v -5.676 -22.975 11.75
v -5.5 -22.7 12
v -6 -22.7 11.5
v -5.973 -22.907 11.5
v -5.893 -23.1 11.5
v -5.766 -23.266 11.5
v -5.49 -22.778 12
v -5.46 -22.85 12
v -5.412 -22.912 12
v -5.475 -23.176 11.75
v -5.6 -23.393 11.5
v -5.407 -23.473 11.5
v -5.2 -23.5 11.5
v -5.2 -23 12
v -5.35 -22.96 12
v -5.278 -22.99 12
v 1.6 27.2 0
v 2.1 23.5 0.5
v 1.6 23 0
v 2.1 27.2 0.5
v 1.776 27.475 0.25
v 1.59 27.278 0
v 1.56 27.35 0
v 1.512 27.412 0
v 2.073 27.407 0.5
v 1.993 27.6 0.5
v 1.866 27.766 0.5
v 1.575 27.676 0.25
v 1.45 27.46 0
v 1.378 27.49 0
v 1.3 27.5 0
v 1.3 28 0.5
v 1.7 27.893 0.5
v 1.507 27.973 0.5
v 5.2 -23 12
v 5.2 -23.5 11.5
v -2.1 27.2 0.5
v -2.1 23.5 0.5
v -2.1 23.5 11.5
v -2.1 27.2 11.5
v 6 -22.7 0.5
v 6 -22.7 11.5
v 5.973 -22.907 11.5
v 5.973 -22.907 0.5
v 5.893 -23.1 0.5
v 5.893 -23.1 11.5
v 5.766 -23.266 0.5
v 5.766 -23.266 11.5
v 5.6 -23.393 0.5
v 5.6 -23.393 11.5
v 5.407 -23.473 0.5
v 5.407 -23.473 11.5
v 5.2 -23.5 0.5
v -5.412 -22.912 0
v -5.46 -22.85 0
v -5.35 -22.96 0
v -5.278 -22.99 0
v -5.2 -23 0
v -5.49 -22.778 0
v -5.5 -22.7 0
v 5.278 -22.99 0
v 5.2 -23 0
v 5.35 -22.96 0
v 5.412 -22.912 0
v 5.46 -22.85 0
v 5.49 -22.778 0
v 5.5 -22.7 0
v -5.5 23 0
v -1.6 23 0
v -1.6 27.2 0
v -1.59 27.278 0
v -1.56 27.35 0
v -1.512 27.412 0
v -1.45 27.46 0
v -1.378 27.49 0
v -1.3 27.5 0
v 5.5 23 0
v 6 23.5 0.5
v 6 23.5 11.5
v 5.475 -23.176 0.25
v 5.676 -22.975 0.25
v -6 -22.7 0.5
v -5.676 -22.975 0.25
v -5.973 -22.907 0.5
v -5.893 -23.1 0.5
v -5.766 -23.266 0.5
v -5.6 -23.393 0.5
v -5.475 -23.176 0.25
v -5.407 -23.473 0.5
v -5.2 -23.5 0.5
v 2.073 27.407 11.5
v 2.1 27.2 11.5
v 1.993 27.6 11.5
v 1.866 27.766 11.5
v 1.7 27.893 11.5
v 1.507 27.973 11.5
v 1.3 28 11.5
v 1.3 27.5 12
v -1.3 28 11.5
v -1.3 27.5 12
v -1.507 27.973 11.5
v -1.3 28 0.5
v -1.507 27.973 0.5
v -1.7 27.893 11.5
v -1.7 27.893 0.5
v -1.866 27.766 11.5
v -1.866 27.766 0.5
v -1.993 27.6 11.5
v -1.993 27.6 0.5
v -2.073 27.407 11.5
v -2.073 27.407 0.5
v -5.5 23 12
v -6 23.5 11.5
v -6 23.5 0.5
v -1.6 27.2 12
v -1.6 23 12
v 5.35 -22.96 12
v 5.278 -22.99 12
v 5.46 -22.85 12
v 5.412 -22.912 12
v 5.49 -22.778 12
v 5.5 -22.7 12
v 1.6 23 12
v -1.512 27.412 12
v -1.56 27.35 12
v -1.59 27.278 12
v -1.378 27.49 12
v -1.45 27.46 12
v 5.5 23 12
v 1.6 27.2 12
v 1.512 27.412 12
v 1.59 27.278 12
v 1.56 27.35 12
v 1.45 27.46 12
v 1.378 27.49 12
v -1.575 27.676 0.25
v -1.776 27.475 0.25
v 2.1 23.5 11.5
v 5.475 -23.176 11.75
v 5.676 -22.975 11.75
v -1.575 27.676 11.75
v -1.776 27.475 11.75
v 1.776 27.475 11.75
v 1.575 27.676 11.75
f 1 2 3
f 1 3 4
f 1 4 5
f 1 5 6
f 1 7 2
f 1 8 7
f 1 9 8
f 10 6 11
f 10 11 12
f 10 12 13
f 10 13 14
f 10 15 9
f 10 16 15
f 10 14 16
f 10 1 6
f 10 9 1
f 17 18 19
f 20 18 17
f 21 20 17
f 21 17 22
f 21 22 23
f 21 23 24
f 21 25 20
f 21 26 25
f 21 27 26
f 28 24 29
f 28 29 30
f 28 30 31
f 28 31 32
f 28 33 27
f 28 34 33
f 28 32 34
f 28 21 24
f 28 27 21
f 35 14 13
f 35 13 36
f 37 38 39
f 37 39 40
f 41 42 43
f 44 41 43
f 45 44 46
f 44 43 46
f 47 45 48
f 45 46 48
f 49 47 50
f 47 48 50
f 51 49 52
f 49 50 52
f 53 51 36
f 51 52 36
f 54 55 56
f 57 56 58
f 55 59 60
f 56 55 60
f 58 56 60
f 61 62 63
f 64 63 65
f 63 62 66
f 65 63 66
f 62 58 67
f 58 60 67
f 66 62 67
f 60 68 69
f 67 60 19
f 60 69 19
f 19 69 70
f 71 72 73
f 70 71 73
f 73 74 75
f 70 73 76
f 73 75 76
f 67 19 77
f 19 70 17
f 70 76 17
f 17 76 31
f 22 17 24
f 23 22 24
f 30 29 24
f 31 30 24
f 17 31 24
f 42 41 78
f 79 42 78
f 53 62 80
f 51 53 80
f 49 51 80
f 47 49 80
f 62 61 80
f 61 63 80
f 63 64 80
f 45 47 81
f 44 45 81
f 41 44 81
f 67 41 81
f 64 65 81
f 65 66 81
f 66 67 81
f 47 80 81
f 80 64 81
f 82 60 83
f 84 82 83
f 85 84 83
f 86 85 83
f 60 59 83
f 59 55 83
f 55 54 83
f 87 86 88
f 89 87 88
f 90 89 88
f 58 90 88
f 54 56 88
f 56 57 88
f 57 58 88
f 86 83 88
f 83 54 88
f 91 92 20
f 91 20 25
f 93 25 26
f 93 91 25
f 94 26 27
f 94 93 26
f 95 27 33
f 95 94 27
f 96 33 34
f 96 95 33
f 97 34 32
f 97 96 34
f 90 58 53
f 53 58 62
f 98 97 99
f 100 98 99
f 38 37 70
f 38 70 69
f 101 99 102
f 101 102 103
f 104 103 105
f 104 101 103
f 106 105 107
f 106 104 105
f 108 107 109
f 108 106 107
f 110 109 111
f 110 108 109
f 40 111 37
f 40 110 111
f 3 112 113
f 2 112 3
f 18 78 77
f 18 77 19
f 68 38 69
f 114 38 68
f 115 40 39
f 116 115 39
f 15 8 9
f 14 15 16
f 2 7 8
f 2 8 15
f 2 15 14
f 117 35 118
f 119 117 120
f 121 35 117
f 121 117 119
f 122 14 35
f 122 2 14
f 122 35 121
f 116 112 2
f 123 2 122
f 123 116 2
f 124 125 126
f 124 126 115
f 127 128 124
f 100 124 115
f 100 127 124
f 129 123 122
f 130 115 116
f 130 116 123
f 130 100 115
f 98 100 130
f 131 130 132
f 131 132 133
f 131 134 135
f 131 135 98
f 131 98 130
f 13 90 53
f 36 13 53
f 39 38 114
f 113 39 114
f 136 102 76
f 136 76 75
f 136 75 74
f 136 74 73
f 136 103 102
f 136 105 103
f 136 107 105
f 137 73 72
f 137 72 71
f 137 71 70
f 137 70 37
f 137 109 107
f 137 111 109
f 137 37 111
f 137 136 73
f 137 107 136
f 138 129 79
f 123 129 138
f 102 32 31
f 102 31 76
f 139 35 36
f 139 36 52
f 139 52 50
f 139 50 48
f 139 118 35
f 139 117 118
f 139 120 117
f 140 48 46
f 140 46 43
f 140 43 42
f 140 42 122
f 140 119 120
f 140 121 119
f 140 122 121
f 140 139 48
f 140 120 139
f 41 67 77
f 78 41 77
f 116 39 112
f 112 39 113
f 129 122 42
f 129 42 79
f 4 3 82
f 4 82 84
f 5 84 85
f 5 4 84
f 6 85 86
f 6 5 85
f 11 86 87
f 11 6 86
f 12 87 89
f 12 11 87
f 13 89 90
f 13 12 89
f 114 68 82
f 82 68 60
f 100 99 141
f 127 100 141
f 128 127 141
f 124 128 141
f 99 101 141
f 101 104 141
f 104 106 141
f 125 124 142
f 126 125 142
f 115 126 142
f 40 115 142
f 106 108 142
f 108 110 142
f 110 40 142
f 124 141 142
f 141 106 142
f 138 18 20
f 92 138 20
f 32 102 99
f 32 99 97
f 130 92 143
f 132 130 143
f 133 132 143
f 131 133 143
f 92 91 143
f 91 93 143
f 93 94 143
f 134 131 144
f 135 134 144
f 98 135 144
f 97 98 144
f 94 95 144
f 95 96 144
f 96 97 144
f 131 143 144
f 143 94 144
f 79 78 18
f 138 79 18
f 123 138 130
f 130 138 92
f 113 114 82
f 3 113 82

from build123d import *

# Parameters (mm, degrees)
F0_W     = 4.2
F0_H     = 4.5
F1_DEPTH = 12
F2_R     = 0.8
F3_SIZE  = 0.5


with BuildPart() as f1:
    # F0 (on Top) → F1 (new body)
    with BuildSketch(Plane.XY):
        Polygon((6, -23.5), (6, 23.5), (2.1, 23.5), (2.1, 19), (-2.1, 19), (-2.1, 23.5), (-6, 23.5), (-6, -23.5), align=None)
        with Locations((0, 21.25)):
            Rectangle(F0_W, F0_H)
        with Locations((0, 25.75)):
            Rectangle(F0_W, F0_H)
    extrude(amount=F1_DEPTH)

    # F2
    f2_edges = [f1.edges().sort_by_distance(p)[0] for p in [
        (2.1, 28, 6),
        (-2.1, 28, 6),
        (6, -23.5, 6),
        (-6, -23.5, 6),
    ]]
    fillet(f2_edges, radius=F2_R)

    # F3
    f3_edges = [f1.edges().sort_by_distance(p)[0] for p in [
        (6, 0.4, 12),
        (5.765685, -23.265685, 12),
        (4.05, 23.5, 12),
        (0, -23.5, 12),
        (2.1, 25.35, 12),
        (-5.765685, -23.265685, 12),
        (1.865685, 27.765685, 12),
        (-6, 0.4, 12),
        (0, 28, 12),
        (-4.05, 23.5, 12),
        (-1.865685, 27.765685, 12),
        (-2.1, 25.35, 12),
        (6, 0.4, 0),
        (5.765685, -23.265685, 0),
        (4.05, 23.5, 0),
        (0, -23.5, 0),
        (2.1, 25.35, 0),
        (-5.765685, -23.265685, 0),
        (1.865685, 27.765685, 0),
        (-6, 0.4, 0),
        (0, 28, 0),
        (-4.05, 23.5, 0),
        (-1.865685, 27.765685, 0),
        (-2.1, 25.35, 0),
    ]]
    chamfer(f3_edges, length=F3_SIZE)


solid = f1.part
